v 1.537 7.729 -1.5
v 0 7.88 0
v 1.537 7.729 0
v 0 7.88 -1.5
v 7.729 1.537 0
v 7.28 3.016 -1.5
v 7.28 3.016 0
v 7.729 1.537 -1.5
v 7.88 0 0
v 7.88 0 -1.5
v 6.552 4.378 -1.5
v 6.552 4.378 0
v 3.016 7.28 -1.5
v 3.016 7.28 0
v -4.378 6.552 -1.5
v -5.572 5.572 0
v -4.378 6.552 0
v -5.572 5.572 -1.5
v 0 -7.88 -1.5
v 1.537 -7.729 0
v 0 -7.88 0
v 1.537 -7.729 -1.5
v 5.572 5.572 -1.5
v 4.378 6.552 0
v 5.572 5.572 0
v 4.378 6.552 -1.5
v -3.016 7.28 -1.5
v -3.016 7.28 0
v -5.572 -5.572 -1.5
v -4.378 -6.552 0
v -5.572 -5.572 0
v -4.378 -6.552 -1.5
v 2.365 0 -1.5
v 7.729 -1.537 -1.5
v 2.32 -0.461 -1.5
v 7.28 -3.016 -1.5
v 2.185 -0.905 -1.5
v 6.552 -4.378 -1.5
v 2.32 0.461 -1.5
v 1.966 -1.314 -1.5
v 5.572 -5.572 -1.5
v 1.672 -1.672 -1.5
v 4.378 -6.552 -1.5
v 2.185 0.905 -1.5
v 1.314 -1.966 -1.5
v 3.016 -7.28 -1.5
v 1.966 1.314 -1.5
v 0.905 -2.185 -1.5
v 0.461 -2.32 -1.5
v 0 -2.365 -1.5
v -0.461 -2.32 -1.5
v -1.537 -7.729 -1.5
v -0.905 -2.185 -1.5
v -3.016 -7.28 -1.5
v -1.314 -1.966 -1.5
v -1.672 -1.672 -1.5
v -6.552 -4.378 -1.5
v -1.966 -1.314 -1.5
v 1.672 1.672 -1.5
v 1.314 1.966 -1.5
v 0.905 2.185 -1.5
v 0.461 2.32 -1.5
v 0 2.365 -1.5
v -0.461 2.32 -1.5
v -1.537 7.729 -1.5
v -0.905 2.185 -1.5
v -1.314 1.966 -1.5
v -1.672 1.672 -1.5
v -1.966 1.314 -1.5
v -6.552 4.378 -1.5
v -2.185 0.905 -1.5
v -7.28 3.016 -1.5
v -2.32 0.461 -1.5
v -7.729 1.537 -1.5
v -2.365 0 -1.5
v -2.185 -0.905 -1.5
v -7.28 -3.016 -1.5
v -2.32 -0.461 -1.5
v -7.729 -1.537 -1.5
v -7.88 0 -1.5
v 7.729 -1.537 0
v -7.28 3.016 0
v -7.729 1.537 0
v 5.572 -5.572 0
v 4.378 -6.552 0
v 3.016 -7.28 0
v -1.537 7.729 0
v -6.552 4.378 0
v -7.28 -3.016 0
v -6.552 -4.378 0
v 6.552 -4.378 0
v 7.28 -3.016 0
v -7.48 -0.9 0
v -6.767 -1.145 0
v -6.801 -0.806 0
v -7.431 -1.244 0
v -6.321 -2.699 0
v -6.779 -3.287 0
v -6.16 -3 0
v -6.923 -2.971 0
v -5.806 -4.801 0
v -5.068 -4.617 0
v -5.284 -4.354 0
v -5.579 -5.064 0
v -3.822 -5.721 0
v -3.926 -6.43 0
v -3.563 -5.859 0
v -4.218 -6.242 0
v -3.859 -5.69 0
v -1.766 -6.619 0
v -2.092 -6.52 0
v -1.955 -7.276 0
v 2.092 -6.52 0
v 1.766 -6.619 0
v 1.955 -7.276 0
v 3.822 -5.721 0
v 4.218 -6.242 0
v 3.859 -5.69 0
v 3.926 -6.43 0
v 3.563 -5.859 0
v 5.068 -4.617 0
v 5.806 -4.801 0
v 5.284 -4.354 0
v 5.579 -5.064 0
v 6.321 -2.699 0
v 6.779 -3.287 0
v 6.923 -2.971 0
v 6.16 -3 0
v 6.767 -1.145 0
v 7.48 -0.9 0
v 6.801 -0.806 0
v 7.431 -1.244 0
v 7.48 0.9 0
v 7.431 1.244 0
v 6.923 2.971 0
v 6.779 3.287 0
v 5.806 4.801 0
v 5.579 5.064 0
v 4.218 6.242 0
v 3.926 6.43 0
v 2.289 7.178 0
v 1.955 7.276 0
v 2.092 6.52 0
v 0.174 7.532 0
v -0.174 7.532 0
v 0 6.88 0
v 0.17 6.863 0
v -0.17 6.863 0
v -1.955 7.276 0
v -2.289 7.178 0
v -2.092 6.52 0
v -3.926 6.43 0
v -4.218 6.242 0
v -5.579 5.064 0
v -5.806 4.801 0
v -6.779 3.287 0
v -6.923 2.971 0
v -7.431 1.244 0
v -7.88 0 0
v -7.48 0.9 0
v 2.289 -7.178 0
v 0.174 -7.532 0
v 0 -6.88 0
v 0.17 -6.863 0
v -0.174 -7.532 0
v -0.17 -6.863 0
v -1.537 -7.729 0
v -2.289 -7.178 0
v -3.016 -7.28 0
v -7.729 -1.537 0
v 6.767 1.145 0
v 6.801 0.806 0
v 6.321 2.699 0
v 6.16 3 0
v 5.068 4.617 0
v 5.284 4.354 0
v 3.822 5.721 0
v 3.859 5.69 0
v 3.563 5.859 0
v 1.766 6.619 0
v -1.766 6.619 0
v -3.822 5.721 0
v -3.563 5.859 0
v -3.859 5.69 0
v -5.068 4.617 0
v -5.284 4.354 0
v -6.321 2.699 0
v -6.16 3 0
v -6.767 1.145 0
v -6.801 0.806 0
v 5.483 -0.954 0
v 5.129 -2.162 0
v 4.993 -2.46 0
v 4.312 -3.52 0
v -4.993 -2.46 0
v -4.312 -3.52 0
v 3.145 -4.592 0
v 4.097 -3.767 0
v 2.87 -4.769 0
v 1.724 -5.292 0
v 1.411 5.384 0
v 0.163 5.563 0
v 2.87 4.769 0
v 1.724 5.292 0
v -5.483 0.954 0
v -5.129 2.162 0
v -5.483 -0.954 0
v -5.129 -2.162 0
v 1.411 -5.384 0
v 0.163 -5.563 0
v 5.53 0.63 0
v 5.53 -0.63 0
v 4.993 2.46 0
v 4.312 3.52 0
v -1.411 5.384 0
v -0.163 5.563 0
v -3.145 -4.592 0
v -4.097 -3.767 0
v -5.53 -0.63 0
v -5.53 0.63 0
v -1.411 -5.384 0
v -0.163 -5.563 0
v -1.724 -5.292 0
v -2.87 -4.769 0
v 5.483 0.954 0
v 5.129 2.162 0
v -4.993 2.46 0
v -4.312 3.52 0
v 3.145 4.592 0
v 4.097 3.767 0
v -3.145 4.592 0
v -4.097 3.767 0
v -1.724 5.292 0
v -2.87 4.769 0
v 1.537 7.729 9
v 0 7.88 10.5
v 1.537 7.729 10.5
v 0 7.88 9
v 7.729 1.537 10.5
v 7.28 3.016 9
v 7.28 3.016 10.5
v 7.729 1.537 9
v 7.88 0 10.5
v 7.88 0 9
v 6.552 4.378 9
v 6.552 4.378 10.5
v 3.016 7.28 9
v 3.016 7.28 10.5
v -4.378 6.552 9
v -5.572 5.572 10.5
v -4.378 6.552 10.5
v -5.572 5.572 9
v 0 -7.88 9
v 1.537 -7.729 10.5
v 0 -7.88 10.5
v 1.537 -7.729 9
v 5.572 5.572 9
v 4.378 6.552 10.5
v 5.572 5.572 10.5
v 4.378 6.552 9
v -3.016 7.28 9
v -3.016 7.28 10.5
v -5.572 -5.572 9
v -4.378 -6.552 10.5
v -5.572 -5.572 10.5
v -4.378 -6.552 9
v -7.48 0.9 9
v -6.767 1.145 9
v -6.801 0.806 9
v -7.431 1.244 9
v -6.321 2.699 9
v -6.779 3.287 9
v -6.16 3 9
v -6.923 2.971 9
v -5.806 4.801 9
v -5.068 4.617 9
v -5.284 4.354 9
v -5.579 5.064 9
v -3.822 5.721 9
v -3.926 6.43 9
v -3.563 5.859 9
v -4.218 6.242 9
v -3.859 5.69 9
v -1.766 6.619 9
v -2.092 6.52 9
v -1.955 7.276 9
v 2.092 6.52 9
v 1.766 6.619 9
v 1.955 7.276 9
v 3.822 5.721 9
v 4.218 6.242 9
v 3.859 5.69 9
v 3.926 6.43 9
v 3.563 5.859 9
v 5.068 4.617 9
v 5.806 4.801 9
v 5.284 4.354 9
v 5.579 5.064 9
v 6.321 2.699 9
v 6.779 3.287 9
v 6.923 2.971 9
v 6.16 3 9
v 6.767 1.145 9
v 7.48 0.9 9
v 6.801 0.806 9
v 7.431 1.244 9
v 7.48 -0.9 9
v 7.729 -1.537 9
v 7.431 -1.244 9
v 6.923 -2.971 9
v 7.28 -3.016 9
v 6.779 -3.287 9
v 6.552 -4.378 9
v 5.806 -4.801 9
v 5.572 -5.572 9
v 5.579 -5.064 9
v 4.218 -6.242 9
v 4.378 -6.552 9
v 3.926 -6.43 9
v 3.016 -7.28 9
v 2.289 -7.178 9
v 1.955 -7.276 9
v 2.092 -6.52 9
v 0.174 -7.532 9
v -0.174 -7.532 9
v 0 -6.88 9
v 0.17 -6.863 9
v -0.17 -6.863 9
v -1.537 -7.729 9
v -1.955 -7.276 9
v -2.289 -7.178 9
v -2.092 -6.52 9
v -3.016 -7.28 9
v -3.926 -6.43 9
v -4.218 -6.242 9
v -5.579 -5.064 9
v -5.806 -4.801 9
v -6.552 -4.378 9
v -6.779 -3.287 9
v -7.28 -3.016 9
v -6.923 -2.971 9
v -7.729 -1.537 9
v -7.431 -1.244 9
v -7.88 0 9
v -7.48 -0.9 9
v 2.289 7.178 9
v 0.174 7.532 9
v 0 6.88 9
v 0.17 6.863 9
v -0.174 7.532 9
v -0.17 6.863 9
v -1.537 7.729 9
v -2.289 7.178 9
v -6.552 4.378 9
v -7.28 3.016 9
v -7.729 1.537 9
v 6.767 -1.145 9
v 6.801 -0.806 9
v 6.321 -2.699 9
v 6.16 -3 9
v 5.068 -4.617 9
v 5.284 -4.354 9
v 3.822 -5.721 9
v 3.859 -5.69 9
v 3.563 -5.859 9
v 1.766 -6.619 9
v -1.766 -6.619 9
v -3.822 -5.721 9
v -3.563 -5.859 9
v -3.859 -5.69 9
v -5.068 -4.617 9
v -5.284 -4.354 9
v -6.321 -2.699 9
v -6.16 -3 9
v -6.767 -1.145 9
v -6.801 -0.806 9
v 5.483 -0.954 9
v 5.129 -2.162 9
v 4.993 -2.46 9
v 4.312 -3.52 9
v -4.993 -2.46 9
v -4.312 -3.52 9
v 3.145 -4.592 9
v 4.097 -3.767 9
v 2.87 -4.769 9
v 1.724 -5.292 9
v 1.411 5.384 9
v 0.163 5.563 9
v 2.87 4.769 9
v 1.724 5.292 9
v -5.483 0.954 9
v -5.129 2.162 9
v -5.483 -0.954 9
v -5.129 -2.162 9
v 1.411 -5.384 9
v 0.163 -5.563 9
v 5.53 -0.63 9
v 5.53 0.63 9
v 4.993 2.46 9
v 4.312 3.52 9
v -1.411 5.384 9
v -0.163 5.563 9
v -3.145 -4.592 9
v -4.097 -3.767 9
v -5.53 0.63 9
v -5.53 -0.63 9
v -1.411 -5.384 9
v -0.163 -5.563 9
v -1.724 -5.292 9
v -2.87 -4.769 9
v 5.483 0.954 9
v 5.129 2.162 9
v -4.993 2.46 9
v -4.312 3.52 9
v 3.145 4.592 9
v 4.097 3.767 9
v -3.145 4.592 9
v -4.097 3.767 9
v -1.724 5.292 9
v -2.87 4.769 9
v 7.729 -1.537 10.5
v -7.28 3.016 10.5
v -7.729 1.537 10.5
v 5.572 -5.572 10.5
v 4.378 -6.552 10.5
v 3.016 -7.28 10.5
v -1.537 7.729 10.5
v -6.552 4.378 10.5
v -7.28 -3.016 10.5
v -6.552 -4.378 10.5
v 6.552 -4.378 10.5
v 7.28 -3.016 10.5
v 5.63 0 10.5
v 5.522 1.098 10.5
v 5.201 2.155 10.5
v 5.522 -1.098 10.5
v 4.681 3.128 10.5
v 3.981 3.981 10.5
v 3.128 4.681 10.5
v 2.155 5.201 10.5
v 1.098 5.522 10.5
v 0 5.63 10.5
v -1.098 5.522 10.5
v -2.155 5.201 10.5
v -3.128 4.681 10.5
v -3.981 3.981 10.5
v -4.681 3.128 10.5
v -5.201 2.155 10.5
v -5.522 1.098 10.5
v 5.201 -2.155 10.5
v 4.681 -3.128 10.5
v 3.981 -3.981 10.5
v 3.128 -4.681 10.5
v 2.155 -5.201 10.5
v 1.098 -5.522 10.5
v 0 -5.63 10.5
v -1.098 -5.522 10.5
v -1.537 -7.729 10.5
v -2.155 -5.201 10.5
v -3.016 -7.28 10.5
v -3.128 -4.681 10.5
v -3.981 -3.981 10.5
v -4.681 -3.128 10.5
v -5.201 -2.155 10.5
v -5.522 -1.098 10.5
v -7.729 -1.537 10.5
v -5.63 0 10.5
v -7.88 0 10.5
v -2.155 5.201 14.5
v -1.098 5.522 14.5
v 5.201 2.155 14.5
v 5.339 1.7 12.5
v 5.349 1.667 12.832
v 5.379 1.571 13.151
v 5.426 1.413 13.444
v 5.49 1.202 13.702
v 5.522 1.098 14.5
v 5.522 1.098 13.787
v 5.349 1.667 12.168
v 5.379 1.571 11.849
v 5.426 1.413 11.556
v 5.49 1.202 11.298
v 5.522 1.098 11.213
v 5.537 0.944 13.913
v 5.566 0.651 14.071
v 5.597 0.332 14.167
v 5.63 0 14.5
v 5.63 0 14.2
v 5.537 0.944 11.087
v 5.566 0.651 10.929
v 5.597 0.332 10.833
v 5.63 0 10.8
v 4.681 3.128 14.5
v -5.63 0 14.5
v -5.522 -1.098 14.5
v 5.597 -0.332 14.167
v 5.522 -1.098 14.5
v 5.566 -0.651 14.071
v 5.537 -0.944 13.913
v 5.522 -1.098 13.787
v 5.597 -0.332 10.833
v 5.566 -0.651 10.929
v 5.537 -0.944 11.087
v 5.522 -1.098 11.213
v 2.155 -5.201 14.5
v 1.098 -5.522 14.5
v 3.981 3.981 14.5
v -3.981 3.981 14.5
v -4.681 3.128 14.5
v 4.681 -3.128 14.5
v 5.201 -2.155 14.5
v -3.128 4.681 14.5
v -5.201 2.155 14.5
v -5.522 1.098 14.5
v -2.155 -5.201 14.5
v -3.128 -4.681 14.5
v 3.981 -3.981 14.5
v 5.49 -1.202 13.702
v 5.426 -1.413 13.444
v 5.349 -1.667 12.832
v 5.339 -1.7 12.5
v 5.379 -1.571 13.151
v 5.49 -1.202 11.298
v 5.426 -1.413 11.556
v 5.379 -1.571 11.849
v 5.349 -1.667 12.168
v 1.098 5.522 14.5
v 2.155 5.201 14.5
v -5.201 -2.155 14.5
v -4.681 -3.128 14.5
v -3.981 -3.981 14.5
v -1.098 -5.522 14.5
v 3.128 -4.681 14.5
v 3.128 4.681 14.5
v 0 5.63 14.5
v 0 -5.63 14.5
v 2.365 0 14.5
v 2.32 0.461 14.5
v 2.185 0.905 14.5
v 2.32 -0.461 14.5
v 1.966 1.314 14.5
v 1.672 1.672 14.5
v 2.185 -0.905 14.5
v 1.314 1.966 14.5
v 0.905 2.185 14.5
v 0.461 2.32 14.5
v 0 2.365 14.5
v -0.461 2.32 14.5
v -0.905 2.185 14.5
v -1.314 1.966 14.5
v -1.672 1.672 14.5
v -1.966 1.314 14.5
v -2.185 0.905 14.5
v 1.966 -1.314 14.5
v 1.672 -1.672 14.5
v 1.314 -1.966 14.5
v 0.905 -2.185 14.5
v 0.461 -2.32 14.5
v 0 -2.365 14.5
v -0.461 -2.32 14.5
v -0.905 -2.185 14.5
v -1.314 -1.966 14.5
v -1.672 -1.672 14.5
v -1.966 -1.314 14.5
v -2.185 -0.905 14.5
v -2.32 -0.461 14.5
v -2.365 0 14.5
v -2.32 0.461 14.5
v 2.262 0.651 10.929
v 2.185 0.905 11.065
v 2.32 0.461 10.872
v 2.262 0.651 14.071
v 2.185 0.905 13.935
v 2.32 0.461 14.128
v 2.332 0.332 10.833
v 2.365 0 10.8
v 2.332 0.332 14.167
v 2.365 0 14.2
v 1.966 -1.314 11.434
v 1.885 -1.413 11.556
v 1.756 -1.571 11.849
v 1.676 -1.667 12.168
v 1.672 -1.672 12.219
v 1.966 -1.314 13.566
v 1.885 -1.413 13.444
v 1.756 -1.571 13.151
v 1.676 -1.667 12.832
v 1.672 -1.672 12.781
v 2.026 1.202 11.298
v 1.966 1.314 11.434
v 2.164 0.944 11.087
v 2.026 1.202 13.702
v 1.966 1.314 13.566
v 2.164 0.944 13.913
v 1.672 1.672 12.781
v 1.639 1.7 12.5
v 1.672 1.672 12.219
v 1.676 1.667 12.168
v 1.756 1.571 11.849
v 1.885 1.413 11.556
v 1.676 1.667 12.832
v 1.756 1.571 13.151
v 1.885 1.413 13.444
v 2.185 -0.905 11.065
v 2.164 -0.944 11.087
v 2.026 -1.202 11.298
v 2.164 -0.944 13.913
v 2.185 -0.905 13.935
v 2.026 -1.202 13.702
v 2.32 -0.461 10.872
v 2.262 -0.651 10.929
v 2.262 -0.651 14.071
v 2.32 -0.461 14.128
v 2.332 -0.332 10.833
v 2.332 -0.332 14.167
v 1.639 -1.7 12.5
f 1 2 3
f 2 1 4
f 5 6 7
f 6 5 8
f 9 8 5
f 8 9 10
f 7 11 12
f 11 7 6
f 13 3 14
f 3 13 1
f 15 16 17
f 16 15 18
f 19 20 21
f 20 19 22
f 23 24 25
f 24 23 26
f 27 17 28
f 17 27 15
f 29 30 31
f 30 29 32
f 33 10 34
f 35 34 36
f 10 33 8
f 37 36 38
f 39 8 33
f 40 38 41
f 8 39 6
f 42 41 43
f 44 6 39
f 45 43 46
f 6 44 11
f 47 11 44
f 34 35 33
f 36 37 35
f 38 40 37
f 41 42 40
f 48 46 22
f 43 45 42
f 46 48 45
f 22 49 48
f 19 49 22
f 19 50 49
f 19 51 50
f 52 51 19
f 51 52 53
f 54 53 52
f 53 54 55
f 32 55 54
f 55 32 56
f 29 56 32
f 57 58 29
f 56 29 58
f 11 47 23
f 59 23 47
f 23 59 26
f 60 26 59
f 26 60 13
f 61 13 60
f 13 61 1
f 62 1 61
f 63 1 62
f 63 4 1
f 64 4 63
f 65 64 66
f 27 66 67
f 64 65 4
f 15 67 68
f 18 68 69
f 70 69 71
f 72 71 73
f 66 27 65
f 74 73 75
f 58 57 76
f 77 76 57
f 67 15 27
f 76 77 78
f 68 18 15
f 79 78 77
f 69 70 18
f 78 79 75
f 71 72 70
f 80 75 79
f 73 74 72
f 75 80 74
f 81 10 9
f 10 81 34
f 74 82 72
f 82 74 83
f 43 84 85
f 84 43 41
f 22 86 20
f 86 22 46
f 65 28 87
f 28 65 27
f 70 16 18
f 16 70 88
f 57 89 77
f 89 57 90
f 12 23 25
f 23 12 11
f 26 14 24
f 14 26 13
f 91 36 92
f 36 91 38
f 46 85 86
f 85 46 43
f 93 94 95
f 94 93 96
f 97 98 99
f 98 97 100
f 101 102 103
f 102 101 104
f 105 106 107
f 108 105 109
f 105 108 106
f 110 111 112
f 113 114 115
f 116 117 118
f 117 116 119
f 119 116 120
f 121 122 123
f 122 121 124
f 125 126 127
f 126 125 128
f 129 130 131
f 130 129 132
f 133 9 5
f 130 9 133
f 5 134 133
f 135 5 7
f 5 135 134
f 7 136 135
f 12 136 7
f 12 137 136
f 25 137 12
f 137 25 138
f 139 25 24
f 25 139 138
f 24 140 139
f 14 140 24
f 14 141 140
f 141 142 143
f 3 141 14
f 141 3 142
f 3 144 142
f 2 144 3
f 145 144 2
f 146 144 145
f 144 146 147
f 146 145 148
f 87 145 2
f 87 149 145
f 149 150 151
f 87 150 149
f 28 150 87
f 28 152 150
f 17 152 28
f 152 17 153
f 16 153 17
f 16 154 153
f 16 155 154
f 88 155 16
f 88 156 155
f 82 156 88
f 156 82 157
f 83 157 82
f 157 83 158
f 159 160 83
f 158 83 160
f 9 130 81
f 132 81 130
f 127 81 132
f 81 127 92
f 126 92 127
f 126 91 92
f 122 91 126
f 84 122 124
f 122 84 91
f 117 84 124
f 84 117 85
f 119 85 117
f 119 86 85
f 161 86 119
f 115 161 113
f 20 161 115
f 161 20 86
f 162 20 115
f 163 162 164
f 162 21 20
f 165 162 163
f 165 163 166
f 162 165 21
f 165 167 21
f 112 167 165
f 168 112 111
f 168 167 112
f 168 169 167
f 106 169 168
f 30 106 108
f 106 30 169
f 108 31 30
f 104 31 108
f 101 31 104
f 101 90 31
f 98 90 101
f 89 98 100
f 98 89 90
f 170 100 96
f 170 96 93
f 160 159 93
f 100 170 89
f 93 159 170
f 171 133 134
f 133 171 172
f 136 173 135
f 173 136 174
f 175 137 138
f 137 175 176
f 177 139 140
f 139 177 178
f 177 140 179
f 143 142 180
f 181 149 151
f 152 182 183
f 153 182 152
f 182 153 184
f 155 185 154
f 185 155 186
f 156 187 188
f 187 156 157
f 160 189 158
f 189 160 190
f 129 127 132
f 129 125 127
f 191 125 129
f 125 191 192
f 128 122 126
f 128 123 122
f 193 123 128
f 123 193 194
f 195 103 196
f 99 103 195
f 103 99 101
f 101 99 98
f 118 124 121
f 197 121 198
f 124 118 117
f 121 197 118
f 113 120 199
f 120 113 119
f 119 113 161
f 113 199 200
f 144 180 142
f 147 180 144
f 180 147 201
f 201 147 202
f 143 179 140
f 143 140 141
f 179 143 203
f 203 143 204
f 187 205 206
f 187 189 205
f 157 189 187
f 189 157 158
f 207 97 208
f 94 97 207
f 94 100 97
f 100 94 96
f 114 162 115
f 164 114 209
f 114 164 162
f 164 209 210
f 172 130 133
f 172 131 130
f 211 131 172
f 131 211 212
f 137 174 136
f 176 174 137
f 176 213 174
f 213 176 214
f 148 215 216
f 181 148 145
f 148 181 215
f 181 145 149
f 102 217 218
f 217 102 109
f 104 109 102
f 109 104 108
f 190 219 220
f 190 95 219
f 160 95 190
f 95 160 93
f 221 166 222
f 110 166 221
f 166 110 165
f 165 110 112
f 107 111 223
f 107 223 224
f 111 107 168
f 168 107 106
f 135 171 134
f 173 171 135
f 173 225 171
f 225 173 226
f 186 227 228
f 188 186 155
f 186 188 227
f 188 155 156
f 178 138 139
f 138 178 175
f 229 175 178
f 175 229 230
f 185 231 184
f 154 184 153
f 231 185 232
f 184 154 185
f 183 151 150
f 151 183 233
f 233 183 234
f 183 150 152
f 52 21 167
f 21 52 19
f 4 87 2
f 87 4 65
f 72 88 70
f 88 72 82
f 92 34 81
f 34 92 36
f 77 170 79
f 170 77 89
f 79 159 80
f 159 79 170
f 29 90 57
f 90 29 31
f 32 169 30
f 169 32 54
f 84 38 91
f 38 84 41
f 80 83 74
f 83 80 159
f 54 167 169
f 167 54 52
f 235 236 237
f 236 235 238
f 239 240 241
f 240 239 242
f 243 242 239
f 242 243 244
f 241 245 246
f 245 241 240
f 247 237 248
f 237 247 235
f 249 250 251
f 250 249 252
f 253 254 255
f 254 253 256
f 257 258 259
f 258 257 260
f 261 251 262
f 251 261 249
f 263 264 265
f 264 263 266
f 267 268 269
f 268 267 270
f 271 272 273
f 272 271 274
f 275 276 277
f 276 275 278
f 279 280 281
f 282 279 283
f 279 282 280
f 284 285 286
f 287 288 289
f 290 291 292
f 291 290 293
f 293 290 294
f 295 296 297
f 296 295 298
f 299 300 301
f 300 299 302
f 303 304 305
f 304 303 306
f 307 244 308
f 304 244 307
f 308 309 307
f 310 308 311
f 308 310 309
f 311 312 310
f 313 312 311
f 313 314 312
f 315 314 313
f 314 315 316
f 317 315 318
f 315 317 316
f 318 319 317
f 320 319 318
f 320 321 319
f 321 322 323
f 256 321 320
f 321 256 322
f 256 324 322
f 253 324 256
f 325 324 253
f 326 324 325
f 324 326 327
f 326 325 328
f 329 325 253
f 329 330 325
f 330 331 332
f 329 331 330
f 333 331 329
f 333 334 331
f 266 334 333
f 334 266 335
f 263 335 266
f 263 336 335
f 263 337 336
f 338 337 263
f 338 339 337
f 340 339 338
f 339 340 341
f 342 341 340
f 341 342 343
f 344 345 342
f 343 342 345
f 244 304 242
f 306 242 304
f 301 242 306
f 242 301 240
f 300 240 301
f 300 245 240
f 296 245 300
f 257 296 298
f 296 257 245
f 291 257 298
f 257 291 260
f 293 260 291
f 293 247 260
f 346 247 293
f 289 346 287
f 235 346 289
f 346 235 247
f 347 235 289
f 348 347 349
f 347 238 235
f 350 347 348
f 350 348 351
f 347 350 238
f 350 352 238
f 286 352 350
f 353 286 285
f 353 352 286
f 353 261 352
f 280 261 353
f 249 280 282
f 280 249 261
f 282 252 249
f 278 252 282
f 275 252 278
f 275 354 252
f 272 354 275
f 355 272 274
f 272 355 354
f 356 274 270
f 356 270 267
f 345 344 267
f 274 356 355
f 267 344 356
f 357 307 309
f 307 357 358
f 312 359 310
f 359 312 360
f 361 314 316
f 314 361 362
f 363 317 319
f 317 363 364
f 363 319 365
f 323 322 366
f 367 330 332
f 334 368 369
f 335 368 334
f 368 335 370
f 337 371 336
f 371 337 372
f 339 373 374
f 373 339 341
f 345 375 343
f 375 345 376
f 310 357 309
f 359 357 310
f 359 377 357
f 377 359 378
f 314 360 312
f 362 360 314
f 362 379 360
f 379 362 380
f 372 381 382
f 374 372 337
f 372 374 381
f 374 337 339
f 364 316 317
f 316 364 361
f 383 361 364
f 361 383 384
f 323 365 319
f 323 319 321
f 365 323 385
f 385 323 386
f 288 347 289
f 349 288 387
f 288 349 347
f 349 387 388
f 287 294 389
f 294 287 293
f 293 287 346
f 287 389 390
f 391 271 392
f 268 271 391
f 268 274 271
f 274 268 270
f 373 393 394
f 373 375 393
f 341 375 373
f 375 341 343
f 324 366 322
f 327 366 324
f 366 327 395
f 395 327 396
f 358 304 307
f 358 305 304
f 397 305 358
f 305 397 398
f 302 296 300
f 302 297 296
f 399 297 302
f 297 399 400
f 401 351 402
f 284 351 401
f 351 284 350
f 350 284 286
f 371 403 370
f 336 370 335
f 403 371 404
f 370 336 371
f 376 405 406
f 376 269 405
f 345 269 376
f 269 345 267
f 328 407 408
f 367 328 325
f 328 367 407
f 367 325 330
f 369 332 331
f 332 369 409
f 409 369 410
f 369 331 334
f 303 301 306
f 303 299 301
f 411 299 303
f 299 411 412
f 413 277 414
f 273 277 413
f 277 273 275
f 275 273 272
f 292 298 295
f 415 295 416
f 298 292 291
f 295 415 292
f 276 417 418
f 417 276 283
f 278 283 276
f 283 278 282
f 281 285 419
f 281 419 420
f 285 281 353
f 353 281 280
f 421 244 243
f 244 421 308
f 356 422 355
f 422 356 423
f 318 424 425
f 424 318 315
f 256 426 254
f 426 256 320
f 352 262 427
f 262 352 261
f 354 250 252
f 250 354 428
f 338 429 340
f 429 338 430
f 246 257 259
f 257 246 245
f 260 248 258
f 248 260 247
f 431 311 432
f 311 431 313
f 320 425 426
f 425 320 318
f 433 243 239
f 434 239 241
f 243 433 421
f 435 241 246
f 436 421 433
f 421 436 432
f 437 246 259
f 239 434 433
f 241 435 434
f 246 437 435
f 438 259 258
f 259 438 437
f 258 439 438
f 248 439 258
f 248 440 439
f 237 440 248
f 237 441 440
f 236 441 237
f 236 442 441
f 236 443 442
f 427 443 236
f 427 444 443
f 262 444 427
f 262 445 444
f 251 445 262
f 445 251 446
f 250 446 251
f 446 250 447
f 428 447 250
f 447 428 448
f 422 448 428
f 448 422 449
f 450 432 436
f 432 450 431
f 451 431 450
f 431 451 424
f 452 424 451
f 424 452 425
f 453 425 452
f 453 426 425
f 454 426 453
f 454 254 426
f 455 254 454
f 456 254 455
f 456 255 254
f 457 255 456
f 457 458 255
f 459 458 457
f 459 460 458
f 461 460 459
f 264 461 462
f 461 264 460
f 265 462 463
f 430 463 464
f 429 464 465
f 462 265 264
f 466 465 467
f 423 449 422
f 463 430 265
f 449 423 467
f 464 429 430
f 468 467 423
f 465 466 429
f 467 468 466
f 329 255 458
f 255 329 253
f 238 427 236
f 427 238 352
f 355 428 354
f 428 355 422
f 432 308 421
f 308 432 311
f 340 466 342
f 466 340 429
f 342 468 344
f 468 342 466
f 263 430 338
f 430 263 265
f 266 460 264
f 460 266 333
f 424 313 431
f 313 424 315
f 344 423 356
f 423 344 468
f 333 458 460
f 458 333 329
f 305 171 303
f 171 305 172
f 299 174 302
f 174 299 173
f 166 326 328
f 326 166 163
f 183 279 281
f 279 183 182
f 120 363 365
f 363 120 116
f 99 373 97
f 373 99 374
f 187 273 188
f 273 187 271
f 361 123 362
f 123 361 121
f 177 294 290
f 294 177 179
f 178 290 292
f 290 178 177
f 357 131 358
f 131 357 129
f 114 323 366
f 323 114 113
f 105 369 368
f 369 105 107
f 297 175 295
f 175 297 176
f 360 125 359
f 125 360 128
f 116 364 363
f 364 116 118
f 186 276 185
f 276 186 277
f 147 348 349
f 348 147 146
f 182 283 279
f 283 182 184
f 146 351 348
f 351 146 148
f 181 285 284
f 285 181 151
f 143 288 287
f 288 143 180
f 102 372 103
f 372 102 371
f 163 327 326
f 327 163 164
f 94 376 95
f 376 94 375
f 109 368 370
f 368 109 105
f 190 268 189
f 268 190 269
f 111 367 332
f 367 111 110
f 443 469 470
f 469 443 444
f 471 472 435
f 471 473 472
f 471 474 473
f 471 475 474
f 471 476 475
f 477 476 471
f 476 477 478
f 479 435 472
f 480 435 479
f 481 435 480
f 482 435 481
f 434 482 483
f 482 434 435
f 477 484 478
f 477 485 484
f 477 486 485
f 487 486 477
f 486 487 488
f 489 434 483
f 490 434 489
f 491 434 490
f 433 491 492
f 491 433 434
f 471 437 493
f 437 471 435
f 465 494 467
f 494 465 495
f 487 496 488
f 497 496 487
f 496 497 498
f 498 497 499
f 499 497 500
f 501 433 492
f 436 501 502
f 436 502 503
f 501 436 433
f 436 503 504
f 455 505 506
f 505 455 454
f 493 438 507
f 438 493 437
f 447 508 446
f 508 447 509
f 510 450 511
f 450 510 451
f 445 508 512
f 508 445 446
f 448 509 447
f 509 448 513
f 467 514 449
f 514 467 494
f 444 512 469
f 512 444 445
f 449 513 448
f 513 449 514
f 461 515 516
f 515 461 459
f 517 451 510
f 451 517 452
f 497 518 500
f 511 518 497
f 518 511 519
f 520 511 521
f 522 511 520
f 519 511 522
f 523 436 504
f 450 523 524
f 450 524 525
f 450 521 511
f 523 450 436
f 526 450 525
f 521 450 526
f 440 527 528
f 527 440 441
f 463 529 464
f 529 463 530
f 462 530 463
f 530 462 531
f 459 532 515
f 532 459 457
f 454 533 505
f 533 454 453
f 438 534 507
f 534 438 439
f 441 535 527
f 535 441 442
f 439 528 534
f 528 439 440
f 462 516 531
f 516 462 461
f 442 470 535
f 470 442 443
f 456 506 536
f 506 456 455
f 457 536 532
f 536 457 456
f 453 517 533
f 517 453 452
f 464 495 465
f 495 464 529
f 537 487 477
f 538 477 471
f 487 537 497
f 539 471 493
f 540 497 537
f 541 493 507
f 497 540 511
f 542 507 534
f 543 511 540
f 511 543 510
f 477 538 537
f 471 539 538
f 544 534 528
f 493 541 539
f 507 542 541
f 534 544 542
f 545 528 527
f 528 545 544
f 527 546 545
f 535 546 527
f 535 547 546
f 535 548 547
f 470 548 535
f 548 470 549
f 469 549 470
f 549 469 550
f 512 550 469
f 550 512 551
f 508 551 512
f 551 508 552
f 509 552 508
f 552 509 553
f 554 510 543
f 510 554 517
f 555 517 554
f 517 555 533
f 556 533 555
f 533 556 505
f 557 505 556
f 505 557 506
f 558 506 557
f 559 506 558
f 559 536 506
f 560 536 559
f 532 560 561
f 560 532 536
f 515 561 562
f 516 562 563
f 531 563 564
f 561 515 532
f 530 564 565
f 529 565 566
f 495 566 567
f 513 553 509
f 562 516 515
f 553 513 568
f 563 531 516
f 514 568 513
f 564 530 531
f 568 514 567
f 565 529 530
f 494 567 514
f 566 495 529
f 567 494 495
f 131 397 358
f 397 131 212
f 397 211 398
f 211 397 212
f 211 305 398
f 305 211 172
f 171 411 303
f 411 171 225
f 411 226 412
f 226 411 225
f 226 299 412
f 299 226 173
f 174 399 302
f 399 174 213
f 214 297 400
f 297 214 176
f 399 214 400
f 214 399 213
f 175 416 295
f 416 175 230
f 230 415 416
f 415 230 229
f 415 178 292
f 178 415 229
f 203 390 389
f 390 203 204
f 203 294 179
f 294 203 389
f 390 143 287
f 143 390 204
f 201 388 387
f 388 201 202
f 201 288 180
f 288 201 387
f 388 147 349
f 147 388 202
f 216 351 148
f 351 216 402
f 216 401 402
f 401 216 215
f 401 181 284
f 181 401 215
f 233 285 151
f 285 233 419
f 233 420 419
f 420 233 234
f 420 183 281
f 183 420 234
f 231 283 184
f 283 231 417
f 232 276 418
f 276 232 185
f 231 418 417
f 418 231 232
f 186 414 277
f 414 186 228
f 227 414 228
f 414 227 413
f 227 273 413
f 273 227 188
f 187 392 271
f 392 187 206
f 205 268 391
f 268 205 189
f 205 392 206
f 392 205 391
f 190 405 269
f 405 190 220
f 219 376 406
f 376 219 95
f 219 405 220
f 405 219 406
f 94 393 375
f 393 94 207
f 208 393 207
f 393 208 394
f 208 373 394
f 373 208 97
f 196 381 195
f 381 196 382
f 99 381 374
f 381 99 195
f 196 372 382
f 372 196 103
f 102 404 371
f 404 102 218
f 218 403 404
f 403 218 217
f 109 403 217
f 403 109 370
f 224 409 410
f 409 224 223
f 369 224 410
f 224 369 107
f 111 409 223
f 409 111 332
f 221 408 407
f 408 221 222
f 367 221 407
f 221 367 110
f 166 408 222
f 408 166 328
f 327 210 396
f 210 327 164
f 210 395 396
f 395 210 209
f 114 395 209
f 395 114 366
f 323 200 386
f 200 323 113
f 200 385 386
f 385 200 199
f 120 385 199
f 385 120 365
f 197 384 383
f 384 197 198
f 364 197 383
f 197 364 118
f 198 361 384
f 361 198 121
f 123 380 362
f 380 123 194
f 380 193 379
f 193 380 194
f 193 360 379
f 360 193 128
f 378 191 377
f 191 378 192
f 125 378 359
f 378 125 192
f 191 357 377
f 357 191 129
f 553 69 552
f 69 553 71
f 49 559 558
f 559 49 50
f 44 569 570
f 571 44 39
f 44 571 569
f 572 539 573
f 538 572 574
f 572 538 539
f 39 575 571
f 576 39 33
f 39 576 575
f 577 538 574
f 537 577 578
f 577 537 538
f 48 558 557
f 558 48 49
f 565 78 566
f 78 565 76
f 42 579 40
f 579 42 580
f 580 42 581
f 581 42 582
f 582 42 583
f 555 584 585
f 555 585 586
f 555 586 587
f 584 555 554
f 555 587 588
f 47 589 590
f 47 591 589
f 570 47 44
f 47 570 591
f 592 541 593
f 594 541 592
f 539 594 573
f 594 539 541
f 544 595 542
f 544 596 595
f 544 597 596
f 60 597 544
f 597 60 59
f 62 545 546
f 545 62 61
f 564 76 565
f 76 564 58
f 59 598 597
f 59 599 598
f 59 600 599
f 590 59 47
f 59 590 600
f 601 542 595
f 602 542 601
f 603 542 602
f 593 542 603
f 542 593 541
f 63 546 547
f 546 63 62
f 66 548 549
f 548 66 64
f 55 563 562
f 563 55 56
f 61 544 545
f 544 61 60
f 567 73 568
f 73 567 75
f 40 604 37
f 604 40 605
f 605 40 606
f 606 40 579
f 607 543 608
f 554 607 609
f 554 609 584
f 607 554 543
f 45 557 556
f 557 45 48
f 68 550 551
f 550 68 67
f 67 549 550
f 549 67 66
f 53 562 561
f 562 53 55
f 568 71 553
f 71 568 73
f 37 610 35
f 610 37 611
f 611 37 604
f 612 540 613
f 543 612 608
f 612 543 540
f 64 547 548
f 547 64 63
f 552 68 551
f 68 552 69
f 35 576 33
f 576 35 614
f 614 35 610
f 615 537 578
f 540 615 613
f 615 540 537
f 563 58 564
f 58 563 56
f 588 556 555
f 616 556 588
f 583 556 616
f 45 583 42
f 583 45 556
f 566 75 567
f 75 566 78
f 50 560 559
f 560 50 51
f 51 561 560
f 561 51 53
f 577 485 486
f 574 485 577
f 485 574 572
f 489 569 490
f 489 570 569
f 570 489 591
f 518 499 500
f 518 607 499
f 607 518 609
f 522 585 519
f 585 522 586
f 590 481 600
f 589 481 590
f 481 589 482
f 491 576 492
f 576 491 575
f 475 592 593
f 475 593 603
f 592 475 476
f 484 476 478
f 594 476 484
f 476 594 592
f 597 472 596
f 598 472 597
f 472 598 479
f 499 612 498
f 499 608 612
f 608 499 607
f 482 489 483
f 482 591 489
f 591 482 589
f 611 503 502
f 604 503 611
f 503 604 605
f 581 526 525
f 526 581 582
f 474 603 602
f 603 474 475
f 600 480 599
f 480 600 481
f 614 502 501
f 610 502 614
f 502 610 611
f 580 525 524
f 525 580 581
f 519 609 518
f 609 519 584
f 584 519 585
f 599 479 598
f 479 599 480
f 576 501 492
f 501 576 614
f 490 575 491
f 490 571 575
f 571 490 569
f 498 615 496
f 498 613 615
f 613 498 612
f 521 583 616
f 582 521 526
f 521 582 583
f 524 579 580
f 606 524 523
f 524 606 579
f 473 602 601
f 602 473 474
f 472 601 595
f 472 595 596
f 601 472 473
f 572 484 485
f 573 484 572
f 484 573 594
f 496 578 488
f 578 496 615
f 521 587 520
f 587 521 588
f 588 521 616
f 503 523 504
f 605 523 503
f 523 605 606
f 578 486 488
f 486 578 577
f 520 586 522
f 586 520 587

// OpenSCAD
$fn = 32;

// ----------------------------------------------------------------------
// Timing pulley: GT2 22T, pitch 2 mm, 15.76 mm x 16 mm
// ----------------------------------------------------------------------

// --- parameters (mm) ---
belt_pitch = 2;           // belt pitch
n_teeth = 22;             // number of grooves
rim_w = 9;                // belt width between the flanges
tip_d = 13.76;            // tip circle diameter
root_d = 12.26;           // groove bottom diameter
groove_h = 0.75;          // groove depth
tooth_w = 1.5;            // groove width at the tip circle
rim_d = 15.76;            // flange diameter
rim_t = 1.5;              // flange thickness
spigot_d = 10.66;         // flange spigot, sunk into the rim
spigot_h = 1.2;           // spigot depth into the rim
shaft_d = 4.73;           // shaft bore
hub_d = 11.26;            // hub diameter
hub_h = 4;                // hub above the flange
bottom_z = -1.5;          // lowest point of the pulley
top_z = 14.5;             // highest point of the pulley
set_d = 3.4;              // set screw tap hole

module rim() {
  cylinder(h = rim_w, d = tip_d);
}

module groove_cutter() {
  /* belt tooth groove: deeper than wide, cut through the belt width */
  translate([root_d / 2, 0, 0])
    linear_extrude(height = rim_w)
      polygon(points = [[-0.6, -tooth_w * 0.42], [groove_h + 0.6, -tooth_w * 0.6],
                        [groove_h + 0.6, tooth_w * 0.6], [-0.6, tooth_w * 0.42]]);
}

module flanges() {
  translate([0, 0, -rim_t]) cylinder(h = rim_t, d = rim_d);
  translate([0, 0, rim_w]) cylinder(h = rim_t, d = rim_d);
  translate([0, 0, -spigot_h]) cylinder(h = spigot_h + 0.6, d = spigot_d);
  translate([0, 0, rim_w - 0.6]) cylinder(h = spigot_h + 0.6, d = spigot_d);
}

module hub() {
  translate([0, 0, bottom_z]) cylinder(h = top_z - bottom_z, d = hub_d);
}

difference() {
  union() {
    rim();
    hub();
    flanges();
  }
  for (i = [0 : n_teeth - 1]) rotate([0, 0, i * 360 / n_teeth]) groove_cutter();
  translate([0, 0, bottom_z - 1]) cylinder(h = top_z - bottom_z + 2, d = shaft_d);
  translate([-1, 0, top_z - hub_h * 0.5]) rotate([0, 90, 0]) cylinder(h = hub_d / 2 + 3, d = set_d);
}
